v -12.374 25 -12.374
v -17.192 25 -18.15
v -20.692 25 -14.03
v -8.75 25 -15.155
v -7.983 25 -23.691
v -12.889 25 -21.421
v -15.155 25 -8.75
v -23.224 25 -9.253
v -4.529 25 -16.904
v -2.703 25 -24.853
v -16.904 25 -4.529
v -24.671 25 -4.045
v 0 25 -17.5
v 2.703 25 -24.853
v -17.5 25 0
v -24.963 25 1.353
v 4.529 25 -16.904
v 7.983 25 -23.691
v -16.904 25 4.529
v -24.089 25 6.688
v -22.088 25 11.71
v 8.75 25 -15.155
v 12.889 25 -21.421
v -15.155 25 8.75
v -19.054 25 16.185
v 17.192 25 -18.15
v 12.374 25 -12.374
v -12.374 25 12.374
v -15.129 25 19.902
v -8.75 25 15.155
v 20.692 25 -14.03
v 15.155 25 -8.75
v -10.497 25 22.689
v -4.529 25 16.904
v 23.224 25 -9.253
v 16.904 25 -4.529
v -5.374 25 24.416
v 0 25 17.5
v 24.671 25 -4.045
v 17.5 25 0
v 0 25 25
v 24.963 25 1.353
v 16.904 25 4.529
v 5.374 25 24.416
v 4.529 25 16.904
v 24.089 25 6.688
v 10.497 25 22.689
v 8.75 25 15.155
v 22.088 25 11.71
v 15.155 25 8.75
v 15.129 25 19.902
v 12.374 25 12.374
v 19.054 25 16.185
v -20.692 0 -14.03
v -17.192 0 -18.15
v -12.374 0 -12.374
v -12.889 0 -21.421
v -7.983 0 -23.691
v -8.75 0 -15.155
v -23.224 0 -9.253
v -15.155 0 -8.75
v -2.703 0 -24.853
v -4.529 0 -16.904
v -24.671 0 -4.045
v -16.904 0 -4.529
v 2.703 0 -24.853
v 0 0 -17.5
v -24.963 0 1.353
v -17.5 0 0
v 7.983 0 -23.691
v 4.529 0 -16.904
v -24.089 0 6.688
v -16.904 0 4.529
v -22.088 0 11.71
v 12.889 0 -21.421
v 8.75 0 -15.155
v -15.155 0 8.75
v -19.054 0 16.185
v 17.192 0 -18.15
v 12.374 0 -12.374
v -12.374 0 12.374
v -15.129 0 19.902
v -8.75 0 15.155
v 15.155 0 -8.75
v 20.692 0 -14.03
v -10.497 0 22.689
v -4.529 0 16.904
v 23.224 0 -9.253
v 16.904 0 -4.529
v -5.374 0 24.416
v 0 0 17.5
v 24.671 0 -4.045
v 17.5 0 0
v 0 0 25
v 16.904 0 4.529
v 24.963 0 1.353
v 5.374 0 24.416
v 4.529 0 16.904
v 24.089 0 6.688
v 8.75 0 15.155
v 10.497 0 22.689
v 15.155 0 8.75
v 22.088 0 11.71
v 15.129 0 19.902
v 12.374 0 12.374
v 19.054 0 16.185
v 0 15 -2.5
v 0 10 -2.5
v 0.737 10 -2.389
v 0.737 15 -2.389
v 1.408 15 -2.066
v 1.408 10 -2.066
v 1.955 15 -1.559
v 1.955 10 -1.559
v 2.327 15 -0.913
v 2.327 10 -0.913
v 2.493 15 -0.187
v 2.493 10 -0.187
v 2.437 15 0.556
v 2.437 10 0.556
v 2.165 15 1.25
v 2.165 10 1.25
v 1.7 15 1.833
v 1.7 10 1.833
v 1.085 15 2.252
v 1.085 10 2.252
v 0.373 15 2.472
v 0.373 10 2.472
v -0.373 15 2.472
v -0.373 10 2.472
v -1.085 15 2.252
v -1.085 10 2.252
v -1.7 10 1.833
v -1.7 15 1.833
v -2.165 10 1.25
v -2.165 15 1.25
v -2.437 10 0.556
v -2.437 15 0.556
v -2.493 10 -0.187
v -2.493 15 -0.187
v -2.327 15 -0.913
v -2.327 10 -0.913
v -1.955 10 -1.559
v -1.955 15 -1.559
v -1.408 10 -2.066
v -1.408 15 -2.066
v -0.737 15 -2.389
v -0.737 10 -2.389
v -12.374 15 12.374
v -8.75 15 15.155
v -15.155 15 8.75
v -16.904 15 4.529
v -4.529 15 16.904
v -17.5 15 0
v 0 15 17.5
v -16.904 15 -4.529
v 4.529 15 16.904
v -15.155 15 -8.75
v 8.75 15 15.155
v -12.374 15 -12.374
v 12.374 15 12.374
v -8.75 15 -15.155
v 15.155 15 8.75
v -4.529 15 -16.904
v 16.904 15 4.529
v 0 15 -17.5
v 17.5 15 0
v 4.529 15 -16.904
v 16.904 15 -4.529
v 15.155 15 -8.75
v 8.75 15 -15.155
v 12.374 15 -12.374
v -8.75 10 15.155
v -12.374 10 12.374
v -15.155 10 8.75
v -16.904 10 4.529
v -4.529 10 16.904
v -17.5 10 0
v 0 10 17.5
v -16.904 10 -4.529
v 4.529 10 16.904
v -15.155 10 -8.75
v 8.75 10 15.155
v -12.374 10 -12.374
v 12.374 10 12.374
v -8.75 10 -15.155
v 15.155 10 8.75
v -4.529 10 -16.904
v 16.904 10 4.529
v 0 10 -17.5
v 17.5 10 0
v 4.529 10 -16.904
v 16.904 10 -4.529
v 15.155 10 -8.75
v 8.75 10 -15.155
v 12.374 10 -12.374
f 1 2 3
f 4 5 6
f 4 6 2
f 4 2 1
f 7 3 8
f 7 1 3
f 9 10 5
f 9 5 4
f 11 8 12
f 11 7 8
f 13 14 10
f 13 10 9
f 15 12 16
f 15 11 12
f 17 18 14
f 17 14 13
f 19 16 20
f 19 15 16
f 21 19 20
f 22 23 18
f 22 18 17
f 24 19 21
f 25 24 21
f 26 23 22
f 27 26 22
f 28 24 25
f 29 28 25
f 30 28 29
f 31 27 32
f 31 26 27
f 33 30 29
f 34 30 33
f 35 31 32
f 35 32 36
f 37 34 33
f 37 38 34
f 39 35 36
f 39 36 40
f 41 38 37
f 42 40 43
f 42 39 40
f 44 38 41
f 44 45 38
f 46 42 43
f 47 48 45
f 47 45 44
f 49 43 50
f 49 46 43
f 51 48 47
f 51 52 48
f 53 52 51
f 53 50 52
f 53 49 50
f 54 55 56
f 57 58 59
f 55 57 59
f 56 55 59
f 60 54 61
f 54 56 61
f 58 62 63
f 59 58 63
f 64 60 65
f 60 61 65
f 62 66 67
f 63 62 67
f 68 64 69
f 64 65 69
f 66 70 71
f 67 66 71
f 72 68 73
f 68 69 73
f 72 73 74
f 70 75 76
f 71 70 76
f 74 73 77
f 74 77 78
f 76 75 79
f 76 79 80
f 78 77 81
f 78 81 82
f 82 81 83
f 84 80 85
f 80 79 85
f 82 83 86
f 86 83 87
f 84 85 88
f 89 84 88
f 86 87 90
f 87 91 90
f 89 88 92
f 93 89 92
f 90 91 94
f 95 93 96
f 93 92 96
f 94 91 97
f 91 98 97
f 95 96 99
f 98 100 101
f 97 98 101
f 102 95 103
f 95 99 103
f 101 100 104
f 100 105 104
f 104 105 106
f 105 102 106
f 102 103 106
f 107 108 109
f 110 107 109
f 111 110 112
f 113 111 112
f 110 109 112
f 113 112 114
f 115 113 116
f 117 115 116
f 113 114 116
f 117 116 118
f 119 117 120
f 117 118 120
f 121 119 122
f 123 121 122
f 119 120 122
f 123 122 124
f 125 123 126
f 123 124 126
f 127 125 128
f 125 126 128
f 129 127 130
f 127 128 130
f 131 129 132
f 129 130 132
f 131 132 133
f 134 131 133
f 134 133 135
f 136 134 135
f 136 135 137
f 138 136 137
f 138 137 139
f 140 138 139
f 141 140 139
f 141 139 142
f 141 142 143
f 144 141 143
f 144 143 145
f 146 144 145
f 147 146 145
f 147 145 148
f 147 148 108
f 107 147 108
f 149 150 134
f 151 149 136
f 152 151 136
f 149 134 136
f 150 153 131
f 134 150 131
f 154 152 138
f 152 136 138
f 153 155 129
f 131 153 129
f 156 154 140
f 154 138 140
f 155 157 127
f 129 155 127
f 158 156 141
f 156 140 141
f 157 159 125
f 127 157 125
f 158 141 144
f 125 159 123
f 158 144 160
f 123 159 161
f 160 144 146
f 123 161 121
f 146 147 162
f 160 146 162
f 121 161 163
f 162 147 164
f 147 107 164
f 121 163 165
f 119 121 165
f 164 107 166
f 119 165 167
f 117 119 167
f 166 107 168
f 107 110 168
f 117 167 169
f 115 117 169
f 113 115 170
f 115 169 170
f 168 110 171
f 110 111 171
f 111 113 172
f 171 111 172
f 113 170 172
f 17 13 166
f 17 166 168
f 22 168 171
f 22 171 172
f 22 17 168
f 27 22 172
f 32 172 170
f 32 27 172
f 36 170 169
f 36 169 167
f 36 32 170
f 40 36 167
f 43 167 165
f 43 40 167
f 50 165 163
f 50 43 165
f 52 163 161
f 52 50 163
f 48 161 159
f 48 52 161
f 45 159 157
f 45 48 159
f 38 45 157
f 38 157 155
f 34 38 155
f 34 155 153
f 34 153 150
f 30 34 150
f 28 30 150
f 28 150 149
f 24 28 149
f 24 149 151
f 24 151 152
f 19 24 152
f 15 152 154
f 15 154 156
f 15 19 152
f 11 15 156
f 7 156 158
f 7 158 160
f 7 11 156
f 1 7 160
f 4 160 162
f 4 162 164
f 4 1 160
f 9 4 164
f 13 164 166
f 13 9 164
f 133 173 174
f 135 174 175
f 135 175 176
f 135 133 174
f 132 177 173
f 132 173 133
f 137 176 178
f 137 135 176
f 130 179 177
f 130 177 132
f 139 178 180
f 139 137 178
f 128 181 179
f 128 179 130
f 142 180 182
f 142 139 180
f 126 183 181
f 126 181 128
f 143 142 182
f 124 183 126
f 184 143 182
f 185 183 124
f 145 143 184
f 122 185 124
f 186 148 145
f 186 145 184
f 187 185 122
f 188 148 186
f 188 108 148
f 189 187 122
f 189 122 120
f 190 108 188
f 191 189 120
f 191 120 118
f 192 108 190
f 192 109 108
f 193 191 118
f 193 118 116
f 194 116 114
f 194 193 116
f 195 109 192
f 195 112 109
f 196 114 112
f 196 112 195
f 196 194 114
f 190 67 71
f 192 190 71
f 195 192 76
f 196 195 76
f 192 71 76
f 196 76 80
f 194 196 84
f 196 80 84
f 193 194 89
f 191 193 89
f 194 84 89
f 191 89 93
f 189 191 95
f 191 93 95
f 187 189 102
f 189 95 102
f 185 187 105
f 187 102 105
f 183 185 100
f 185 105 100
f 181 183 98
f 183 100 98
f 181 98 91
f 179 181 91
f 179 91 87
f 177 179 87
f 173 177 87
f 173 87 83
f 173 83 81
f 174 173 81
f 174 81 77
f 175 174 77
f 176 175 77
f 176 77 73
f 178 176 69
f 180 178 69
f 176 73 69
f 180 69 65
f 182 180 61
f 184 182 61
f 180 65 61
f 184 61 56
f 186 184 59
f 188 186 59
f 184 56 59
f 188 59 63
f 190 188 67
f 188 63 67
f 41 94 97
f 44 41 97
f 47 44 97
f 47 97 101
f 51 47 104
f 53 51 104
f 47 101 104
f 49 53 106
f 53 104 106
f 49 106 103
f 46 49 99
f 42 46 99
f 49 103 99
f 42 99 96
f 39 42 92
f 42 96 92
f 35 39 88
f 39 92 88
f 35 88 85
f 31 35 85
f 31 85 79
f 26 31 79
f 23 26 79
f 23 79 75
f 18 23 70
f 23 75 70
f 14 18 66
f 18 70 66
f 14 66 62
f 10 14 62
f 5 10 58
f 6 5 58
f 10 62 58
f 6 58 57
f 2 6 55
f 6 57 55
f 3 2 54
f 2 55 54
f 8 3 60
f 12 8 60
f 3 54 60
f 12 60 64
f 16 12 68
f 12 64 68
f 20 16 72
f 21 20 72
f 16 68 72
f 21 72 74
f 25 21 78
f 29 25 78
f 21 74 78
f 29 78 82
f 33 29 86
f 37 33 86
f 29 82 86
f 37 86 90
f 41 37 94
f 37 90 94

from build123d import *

# Parameters (mm, degrees)
SKETCH_1_R          = 25
EXTRUDE_1_DEPTH     = 25
SKETCH_2_R          = 17.5
CUT_EXTRUDE_1_DEPTH = 10
SKETCH_3_R          = 2.5
CUT_EXTRUDE_2_DEPTH = 39.405728739


with BuildPart() as part:
    # 草图1 → 凸台-拉伸1 (new body)
    with BuildSketch(Plane(origin=(0, 0, 0), x_dir=(1, 0, 0), z_dir=(0, 1, 0))):
        with Locations(Location((0, 0, 0), (0, 0, 270))):
            Circle(SKETCH_1_R)
    extrude(amount=EXTRUDE_1_DEPTH)

    # 草图2 → 切除-拉伸1 (cut)
    with BuildSketch(Plane.XZ):
        with Locations(Location((0, 0, 0), (0, 0, 270))):
            Circle(SKETCH_2_R)
    cut_extrude_1 = extrude(amount=-CUT_EXTRUDE_1_DEPTH, mode=Mode.SUBTRACT)

    # 镜向1: 切除-拉伸1 across plane
    add(cut_extrude_1.mirror(Plane(origin=(0, 12.5, 0), x_dir=(0, 0, 1), z_dir=(0, -1, 0))), mode=Mode.SUBTRACT)

    # 草图3 → 切除-拉伸2 (cut, through all)
    with BuildSketch(Plane.XZ.offset(-10)):
        with Locations(Location((0, 0, 0), (0, 0, 270))):
            Circle(SKETCH_3_R)
    extrude(amount=-CUT_EXTRUDE_2_DEPTH, mode=Mode.SUBTRACT)


solid = part.part
